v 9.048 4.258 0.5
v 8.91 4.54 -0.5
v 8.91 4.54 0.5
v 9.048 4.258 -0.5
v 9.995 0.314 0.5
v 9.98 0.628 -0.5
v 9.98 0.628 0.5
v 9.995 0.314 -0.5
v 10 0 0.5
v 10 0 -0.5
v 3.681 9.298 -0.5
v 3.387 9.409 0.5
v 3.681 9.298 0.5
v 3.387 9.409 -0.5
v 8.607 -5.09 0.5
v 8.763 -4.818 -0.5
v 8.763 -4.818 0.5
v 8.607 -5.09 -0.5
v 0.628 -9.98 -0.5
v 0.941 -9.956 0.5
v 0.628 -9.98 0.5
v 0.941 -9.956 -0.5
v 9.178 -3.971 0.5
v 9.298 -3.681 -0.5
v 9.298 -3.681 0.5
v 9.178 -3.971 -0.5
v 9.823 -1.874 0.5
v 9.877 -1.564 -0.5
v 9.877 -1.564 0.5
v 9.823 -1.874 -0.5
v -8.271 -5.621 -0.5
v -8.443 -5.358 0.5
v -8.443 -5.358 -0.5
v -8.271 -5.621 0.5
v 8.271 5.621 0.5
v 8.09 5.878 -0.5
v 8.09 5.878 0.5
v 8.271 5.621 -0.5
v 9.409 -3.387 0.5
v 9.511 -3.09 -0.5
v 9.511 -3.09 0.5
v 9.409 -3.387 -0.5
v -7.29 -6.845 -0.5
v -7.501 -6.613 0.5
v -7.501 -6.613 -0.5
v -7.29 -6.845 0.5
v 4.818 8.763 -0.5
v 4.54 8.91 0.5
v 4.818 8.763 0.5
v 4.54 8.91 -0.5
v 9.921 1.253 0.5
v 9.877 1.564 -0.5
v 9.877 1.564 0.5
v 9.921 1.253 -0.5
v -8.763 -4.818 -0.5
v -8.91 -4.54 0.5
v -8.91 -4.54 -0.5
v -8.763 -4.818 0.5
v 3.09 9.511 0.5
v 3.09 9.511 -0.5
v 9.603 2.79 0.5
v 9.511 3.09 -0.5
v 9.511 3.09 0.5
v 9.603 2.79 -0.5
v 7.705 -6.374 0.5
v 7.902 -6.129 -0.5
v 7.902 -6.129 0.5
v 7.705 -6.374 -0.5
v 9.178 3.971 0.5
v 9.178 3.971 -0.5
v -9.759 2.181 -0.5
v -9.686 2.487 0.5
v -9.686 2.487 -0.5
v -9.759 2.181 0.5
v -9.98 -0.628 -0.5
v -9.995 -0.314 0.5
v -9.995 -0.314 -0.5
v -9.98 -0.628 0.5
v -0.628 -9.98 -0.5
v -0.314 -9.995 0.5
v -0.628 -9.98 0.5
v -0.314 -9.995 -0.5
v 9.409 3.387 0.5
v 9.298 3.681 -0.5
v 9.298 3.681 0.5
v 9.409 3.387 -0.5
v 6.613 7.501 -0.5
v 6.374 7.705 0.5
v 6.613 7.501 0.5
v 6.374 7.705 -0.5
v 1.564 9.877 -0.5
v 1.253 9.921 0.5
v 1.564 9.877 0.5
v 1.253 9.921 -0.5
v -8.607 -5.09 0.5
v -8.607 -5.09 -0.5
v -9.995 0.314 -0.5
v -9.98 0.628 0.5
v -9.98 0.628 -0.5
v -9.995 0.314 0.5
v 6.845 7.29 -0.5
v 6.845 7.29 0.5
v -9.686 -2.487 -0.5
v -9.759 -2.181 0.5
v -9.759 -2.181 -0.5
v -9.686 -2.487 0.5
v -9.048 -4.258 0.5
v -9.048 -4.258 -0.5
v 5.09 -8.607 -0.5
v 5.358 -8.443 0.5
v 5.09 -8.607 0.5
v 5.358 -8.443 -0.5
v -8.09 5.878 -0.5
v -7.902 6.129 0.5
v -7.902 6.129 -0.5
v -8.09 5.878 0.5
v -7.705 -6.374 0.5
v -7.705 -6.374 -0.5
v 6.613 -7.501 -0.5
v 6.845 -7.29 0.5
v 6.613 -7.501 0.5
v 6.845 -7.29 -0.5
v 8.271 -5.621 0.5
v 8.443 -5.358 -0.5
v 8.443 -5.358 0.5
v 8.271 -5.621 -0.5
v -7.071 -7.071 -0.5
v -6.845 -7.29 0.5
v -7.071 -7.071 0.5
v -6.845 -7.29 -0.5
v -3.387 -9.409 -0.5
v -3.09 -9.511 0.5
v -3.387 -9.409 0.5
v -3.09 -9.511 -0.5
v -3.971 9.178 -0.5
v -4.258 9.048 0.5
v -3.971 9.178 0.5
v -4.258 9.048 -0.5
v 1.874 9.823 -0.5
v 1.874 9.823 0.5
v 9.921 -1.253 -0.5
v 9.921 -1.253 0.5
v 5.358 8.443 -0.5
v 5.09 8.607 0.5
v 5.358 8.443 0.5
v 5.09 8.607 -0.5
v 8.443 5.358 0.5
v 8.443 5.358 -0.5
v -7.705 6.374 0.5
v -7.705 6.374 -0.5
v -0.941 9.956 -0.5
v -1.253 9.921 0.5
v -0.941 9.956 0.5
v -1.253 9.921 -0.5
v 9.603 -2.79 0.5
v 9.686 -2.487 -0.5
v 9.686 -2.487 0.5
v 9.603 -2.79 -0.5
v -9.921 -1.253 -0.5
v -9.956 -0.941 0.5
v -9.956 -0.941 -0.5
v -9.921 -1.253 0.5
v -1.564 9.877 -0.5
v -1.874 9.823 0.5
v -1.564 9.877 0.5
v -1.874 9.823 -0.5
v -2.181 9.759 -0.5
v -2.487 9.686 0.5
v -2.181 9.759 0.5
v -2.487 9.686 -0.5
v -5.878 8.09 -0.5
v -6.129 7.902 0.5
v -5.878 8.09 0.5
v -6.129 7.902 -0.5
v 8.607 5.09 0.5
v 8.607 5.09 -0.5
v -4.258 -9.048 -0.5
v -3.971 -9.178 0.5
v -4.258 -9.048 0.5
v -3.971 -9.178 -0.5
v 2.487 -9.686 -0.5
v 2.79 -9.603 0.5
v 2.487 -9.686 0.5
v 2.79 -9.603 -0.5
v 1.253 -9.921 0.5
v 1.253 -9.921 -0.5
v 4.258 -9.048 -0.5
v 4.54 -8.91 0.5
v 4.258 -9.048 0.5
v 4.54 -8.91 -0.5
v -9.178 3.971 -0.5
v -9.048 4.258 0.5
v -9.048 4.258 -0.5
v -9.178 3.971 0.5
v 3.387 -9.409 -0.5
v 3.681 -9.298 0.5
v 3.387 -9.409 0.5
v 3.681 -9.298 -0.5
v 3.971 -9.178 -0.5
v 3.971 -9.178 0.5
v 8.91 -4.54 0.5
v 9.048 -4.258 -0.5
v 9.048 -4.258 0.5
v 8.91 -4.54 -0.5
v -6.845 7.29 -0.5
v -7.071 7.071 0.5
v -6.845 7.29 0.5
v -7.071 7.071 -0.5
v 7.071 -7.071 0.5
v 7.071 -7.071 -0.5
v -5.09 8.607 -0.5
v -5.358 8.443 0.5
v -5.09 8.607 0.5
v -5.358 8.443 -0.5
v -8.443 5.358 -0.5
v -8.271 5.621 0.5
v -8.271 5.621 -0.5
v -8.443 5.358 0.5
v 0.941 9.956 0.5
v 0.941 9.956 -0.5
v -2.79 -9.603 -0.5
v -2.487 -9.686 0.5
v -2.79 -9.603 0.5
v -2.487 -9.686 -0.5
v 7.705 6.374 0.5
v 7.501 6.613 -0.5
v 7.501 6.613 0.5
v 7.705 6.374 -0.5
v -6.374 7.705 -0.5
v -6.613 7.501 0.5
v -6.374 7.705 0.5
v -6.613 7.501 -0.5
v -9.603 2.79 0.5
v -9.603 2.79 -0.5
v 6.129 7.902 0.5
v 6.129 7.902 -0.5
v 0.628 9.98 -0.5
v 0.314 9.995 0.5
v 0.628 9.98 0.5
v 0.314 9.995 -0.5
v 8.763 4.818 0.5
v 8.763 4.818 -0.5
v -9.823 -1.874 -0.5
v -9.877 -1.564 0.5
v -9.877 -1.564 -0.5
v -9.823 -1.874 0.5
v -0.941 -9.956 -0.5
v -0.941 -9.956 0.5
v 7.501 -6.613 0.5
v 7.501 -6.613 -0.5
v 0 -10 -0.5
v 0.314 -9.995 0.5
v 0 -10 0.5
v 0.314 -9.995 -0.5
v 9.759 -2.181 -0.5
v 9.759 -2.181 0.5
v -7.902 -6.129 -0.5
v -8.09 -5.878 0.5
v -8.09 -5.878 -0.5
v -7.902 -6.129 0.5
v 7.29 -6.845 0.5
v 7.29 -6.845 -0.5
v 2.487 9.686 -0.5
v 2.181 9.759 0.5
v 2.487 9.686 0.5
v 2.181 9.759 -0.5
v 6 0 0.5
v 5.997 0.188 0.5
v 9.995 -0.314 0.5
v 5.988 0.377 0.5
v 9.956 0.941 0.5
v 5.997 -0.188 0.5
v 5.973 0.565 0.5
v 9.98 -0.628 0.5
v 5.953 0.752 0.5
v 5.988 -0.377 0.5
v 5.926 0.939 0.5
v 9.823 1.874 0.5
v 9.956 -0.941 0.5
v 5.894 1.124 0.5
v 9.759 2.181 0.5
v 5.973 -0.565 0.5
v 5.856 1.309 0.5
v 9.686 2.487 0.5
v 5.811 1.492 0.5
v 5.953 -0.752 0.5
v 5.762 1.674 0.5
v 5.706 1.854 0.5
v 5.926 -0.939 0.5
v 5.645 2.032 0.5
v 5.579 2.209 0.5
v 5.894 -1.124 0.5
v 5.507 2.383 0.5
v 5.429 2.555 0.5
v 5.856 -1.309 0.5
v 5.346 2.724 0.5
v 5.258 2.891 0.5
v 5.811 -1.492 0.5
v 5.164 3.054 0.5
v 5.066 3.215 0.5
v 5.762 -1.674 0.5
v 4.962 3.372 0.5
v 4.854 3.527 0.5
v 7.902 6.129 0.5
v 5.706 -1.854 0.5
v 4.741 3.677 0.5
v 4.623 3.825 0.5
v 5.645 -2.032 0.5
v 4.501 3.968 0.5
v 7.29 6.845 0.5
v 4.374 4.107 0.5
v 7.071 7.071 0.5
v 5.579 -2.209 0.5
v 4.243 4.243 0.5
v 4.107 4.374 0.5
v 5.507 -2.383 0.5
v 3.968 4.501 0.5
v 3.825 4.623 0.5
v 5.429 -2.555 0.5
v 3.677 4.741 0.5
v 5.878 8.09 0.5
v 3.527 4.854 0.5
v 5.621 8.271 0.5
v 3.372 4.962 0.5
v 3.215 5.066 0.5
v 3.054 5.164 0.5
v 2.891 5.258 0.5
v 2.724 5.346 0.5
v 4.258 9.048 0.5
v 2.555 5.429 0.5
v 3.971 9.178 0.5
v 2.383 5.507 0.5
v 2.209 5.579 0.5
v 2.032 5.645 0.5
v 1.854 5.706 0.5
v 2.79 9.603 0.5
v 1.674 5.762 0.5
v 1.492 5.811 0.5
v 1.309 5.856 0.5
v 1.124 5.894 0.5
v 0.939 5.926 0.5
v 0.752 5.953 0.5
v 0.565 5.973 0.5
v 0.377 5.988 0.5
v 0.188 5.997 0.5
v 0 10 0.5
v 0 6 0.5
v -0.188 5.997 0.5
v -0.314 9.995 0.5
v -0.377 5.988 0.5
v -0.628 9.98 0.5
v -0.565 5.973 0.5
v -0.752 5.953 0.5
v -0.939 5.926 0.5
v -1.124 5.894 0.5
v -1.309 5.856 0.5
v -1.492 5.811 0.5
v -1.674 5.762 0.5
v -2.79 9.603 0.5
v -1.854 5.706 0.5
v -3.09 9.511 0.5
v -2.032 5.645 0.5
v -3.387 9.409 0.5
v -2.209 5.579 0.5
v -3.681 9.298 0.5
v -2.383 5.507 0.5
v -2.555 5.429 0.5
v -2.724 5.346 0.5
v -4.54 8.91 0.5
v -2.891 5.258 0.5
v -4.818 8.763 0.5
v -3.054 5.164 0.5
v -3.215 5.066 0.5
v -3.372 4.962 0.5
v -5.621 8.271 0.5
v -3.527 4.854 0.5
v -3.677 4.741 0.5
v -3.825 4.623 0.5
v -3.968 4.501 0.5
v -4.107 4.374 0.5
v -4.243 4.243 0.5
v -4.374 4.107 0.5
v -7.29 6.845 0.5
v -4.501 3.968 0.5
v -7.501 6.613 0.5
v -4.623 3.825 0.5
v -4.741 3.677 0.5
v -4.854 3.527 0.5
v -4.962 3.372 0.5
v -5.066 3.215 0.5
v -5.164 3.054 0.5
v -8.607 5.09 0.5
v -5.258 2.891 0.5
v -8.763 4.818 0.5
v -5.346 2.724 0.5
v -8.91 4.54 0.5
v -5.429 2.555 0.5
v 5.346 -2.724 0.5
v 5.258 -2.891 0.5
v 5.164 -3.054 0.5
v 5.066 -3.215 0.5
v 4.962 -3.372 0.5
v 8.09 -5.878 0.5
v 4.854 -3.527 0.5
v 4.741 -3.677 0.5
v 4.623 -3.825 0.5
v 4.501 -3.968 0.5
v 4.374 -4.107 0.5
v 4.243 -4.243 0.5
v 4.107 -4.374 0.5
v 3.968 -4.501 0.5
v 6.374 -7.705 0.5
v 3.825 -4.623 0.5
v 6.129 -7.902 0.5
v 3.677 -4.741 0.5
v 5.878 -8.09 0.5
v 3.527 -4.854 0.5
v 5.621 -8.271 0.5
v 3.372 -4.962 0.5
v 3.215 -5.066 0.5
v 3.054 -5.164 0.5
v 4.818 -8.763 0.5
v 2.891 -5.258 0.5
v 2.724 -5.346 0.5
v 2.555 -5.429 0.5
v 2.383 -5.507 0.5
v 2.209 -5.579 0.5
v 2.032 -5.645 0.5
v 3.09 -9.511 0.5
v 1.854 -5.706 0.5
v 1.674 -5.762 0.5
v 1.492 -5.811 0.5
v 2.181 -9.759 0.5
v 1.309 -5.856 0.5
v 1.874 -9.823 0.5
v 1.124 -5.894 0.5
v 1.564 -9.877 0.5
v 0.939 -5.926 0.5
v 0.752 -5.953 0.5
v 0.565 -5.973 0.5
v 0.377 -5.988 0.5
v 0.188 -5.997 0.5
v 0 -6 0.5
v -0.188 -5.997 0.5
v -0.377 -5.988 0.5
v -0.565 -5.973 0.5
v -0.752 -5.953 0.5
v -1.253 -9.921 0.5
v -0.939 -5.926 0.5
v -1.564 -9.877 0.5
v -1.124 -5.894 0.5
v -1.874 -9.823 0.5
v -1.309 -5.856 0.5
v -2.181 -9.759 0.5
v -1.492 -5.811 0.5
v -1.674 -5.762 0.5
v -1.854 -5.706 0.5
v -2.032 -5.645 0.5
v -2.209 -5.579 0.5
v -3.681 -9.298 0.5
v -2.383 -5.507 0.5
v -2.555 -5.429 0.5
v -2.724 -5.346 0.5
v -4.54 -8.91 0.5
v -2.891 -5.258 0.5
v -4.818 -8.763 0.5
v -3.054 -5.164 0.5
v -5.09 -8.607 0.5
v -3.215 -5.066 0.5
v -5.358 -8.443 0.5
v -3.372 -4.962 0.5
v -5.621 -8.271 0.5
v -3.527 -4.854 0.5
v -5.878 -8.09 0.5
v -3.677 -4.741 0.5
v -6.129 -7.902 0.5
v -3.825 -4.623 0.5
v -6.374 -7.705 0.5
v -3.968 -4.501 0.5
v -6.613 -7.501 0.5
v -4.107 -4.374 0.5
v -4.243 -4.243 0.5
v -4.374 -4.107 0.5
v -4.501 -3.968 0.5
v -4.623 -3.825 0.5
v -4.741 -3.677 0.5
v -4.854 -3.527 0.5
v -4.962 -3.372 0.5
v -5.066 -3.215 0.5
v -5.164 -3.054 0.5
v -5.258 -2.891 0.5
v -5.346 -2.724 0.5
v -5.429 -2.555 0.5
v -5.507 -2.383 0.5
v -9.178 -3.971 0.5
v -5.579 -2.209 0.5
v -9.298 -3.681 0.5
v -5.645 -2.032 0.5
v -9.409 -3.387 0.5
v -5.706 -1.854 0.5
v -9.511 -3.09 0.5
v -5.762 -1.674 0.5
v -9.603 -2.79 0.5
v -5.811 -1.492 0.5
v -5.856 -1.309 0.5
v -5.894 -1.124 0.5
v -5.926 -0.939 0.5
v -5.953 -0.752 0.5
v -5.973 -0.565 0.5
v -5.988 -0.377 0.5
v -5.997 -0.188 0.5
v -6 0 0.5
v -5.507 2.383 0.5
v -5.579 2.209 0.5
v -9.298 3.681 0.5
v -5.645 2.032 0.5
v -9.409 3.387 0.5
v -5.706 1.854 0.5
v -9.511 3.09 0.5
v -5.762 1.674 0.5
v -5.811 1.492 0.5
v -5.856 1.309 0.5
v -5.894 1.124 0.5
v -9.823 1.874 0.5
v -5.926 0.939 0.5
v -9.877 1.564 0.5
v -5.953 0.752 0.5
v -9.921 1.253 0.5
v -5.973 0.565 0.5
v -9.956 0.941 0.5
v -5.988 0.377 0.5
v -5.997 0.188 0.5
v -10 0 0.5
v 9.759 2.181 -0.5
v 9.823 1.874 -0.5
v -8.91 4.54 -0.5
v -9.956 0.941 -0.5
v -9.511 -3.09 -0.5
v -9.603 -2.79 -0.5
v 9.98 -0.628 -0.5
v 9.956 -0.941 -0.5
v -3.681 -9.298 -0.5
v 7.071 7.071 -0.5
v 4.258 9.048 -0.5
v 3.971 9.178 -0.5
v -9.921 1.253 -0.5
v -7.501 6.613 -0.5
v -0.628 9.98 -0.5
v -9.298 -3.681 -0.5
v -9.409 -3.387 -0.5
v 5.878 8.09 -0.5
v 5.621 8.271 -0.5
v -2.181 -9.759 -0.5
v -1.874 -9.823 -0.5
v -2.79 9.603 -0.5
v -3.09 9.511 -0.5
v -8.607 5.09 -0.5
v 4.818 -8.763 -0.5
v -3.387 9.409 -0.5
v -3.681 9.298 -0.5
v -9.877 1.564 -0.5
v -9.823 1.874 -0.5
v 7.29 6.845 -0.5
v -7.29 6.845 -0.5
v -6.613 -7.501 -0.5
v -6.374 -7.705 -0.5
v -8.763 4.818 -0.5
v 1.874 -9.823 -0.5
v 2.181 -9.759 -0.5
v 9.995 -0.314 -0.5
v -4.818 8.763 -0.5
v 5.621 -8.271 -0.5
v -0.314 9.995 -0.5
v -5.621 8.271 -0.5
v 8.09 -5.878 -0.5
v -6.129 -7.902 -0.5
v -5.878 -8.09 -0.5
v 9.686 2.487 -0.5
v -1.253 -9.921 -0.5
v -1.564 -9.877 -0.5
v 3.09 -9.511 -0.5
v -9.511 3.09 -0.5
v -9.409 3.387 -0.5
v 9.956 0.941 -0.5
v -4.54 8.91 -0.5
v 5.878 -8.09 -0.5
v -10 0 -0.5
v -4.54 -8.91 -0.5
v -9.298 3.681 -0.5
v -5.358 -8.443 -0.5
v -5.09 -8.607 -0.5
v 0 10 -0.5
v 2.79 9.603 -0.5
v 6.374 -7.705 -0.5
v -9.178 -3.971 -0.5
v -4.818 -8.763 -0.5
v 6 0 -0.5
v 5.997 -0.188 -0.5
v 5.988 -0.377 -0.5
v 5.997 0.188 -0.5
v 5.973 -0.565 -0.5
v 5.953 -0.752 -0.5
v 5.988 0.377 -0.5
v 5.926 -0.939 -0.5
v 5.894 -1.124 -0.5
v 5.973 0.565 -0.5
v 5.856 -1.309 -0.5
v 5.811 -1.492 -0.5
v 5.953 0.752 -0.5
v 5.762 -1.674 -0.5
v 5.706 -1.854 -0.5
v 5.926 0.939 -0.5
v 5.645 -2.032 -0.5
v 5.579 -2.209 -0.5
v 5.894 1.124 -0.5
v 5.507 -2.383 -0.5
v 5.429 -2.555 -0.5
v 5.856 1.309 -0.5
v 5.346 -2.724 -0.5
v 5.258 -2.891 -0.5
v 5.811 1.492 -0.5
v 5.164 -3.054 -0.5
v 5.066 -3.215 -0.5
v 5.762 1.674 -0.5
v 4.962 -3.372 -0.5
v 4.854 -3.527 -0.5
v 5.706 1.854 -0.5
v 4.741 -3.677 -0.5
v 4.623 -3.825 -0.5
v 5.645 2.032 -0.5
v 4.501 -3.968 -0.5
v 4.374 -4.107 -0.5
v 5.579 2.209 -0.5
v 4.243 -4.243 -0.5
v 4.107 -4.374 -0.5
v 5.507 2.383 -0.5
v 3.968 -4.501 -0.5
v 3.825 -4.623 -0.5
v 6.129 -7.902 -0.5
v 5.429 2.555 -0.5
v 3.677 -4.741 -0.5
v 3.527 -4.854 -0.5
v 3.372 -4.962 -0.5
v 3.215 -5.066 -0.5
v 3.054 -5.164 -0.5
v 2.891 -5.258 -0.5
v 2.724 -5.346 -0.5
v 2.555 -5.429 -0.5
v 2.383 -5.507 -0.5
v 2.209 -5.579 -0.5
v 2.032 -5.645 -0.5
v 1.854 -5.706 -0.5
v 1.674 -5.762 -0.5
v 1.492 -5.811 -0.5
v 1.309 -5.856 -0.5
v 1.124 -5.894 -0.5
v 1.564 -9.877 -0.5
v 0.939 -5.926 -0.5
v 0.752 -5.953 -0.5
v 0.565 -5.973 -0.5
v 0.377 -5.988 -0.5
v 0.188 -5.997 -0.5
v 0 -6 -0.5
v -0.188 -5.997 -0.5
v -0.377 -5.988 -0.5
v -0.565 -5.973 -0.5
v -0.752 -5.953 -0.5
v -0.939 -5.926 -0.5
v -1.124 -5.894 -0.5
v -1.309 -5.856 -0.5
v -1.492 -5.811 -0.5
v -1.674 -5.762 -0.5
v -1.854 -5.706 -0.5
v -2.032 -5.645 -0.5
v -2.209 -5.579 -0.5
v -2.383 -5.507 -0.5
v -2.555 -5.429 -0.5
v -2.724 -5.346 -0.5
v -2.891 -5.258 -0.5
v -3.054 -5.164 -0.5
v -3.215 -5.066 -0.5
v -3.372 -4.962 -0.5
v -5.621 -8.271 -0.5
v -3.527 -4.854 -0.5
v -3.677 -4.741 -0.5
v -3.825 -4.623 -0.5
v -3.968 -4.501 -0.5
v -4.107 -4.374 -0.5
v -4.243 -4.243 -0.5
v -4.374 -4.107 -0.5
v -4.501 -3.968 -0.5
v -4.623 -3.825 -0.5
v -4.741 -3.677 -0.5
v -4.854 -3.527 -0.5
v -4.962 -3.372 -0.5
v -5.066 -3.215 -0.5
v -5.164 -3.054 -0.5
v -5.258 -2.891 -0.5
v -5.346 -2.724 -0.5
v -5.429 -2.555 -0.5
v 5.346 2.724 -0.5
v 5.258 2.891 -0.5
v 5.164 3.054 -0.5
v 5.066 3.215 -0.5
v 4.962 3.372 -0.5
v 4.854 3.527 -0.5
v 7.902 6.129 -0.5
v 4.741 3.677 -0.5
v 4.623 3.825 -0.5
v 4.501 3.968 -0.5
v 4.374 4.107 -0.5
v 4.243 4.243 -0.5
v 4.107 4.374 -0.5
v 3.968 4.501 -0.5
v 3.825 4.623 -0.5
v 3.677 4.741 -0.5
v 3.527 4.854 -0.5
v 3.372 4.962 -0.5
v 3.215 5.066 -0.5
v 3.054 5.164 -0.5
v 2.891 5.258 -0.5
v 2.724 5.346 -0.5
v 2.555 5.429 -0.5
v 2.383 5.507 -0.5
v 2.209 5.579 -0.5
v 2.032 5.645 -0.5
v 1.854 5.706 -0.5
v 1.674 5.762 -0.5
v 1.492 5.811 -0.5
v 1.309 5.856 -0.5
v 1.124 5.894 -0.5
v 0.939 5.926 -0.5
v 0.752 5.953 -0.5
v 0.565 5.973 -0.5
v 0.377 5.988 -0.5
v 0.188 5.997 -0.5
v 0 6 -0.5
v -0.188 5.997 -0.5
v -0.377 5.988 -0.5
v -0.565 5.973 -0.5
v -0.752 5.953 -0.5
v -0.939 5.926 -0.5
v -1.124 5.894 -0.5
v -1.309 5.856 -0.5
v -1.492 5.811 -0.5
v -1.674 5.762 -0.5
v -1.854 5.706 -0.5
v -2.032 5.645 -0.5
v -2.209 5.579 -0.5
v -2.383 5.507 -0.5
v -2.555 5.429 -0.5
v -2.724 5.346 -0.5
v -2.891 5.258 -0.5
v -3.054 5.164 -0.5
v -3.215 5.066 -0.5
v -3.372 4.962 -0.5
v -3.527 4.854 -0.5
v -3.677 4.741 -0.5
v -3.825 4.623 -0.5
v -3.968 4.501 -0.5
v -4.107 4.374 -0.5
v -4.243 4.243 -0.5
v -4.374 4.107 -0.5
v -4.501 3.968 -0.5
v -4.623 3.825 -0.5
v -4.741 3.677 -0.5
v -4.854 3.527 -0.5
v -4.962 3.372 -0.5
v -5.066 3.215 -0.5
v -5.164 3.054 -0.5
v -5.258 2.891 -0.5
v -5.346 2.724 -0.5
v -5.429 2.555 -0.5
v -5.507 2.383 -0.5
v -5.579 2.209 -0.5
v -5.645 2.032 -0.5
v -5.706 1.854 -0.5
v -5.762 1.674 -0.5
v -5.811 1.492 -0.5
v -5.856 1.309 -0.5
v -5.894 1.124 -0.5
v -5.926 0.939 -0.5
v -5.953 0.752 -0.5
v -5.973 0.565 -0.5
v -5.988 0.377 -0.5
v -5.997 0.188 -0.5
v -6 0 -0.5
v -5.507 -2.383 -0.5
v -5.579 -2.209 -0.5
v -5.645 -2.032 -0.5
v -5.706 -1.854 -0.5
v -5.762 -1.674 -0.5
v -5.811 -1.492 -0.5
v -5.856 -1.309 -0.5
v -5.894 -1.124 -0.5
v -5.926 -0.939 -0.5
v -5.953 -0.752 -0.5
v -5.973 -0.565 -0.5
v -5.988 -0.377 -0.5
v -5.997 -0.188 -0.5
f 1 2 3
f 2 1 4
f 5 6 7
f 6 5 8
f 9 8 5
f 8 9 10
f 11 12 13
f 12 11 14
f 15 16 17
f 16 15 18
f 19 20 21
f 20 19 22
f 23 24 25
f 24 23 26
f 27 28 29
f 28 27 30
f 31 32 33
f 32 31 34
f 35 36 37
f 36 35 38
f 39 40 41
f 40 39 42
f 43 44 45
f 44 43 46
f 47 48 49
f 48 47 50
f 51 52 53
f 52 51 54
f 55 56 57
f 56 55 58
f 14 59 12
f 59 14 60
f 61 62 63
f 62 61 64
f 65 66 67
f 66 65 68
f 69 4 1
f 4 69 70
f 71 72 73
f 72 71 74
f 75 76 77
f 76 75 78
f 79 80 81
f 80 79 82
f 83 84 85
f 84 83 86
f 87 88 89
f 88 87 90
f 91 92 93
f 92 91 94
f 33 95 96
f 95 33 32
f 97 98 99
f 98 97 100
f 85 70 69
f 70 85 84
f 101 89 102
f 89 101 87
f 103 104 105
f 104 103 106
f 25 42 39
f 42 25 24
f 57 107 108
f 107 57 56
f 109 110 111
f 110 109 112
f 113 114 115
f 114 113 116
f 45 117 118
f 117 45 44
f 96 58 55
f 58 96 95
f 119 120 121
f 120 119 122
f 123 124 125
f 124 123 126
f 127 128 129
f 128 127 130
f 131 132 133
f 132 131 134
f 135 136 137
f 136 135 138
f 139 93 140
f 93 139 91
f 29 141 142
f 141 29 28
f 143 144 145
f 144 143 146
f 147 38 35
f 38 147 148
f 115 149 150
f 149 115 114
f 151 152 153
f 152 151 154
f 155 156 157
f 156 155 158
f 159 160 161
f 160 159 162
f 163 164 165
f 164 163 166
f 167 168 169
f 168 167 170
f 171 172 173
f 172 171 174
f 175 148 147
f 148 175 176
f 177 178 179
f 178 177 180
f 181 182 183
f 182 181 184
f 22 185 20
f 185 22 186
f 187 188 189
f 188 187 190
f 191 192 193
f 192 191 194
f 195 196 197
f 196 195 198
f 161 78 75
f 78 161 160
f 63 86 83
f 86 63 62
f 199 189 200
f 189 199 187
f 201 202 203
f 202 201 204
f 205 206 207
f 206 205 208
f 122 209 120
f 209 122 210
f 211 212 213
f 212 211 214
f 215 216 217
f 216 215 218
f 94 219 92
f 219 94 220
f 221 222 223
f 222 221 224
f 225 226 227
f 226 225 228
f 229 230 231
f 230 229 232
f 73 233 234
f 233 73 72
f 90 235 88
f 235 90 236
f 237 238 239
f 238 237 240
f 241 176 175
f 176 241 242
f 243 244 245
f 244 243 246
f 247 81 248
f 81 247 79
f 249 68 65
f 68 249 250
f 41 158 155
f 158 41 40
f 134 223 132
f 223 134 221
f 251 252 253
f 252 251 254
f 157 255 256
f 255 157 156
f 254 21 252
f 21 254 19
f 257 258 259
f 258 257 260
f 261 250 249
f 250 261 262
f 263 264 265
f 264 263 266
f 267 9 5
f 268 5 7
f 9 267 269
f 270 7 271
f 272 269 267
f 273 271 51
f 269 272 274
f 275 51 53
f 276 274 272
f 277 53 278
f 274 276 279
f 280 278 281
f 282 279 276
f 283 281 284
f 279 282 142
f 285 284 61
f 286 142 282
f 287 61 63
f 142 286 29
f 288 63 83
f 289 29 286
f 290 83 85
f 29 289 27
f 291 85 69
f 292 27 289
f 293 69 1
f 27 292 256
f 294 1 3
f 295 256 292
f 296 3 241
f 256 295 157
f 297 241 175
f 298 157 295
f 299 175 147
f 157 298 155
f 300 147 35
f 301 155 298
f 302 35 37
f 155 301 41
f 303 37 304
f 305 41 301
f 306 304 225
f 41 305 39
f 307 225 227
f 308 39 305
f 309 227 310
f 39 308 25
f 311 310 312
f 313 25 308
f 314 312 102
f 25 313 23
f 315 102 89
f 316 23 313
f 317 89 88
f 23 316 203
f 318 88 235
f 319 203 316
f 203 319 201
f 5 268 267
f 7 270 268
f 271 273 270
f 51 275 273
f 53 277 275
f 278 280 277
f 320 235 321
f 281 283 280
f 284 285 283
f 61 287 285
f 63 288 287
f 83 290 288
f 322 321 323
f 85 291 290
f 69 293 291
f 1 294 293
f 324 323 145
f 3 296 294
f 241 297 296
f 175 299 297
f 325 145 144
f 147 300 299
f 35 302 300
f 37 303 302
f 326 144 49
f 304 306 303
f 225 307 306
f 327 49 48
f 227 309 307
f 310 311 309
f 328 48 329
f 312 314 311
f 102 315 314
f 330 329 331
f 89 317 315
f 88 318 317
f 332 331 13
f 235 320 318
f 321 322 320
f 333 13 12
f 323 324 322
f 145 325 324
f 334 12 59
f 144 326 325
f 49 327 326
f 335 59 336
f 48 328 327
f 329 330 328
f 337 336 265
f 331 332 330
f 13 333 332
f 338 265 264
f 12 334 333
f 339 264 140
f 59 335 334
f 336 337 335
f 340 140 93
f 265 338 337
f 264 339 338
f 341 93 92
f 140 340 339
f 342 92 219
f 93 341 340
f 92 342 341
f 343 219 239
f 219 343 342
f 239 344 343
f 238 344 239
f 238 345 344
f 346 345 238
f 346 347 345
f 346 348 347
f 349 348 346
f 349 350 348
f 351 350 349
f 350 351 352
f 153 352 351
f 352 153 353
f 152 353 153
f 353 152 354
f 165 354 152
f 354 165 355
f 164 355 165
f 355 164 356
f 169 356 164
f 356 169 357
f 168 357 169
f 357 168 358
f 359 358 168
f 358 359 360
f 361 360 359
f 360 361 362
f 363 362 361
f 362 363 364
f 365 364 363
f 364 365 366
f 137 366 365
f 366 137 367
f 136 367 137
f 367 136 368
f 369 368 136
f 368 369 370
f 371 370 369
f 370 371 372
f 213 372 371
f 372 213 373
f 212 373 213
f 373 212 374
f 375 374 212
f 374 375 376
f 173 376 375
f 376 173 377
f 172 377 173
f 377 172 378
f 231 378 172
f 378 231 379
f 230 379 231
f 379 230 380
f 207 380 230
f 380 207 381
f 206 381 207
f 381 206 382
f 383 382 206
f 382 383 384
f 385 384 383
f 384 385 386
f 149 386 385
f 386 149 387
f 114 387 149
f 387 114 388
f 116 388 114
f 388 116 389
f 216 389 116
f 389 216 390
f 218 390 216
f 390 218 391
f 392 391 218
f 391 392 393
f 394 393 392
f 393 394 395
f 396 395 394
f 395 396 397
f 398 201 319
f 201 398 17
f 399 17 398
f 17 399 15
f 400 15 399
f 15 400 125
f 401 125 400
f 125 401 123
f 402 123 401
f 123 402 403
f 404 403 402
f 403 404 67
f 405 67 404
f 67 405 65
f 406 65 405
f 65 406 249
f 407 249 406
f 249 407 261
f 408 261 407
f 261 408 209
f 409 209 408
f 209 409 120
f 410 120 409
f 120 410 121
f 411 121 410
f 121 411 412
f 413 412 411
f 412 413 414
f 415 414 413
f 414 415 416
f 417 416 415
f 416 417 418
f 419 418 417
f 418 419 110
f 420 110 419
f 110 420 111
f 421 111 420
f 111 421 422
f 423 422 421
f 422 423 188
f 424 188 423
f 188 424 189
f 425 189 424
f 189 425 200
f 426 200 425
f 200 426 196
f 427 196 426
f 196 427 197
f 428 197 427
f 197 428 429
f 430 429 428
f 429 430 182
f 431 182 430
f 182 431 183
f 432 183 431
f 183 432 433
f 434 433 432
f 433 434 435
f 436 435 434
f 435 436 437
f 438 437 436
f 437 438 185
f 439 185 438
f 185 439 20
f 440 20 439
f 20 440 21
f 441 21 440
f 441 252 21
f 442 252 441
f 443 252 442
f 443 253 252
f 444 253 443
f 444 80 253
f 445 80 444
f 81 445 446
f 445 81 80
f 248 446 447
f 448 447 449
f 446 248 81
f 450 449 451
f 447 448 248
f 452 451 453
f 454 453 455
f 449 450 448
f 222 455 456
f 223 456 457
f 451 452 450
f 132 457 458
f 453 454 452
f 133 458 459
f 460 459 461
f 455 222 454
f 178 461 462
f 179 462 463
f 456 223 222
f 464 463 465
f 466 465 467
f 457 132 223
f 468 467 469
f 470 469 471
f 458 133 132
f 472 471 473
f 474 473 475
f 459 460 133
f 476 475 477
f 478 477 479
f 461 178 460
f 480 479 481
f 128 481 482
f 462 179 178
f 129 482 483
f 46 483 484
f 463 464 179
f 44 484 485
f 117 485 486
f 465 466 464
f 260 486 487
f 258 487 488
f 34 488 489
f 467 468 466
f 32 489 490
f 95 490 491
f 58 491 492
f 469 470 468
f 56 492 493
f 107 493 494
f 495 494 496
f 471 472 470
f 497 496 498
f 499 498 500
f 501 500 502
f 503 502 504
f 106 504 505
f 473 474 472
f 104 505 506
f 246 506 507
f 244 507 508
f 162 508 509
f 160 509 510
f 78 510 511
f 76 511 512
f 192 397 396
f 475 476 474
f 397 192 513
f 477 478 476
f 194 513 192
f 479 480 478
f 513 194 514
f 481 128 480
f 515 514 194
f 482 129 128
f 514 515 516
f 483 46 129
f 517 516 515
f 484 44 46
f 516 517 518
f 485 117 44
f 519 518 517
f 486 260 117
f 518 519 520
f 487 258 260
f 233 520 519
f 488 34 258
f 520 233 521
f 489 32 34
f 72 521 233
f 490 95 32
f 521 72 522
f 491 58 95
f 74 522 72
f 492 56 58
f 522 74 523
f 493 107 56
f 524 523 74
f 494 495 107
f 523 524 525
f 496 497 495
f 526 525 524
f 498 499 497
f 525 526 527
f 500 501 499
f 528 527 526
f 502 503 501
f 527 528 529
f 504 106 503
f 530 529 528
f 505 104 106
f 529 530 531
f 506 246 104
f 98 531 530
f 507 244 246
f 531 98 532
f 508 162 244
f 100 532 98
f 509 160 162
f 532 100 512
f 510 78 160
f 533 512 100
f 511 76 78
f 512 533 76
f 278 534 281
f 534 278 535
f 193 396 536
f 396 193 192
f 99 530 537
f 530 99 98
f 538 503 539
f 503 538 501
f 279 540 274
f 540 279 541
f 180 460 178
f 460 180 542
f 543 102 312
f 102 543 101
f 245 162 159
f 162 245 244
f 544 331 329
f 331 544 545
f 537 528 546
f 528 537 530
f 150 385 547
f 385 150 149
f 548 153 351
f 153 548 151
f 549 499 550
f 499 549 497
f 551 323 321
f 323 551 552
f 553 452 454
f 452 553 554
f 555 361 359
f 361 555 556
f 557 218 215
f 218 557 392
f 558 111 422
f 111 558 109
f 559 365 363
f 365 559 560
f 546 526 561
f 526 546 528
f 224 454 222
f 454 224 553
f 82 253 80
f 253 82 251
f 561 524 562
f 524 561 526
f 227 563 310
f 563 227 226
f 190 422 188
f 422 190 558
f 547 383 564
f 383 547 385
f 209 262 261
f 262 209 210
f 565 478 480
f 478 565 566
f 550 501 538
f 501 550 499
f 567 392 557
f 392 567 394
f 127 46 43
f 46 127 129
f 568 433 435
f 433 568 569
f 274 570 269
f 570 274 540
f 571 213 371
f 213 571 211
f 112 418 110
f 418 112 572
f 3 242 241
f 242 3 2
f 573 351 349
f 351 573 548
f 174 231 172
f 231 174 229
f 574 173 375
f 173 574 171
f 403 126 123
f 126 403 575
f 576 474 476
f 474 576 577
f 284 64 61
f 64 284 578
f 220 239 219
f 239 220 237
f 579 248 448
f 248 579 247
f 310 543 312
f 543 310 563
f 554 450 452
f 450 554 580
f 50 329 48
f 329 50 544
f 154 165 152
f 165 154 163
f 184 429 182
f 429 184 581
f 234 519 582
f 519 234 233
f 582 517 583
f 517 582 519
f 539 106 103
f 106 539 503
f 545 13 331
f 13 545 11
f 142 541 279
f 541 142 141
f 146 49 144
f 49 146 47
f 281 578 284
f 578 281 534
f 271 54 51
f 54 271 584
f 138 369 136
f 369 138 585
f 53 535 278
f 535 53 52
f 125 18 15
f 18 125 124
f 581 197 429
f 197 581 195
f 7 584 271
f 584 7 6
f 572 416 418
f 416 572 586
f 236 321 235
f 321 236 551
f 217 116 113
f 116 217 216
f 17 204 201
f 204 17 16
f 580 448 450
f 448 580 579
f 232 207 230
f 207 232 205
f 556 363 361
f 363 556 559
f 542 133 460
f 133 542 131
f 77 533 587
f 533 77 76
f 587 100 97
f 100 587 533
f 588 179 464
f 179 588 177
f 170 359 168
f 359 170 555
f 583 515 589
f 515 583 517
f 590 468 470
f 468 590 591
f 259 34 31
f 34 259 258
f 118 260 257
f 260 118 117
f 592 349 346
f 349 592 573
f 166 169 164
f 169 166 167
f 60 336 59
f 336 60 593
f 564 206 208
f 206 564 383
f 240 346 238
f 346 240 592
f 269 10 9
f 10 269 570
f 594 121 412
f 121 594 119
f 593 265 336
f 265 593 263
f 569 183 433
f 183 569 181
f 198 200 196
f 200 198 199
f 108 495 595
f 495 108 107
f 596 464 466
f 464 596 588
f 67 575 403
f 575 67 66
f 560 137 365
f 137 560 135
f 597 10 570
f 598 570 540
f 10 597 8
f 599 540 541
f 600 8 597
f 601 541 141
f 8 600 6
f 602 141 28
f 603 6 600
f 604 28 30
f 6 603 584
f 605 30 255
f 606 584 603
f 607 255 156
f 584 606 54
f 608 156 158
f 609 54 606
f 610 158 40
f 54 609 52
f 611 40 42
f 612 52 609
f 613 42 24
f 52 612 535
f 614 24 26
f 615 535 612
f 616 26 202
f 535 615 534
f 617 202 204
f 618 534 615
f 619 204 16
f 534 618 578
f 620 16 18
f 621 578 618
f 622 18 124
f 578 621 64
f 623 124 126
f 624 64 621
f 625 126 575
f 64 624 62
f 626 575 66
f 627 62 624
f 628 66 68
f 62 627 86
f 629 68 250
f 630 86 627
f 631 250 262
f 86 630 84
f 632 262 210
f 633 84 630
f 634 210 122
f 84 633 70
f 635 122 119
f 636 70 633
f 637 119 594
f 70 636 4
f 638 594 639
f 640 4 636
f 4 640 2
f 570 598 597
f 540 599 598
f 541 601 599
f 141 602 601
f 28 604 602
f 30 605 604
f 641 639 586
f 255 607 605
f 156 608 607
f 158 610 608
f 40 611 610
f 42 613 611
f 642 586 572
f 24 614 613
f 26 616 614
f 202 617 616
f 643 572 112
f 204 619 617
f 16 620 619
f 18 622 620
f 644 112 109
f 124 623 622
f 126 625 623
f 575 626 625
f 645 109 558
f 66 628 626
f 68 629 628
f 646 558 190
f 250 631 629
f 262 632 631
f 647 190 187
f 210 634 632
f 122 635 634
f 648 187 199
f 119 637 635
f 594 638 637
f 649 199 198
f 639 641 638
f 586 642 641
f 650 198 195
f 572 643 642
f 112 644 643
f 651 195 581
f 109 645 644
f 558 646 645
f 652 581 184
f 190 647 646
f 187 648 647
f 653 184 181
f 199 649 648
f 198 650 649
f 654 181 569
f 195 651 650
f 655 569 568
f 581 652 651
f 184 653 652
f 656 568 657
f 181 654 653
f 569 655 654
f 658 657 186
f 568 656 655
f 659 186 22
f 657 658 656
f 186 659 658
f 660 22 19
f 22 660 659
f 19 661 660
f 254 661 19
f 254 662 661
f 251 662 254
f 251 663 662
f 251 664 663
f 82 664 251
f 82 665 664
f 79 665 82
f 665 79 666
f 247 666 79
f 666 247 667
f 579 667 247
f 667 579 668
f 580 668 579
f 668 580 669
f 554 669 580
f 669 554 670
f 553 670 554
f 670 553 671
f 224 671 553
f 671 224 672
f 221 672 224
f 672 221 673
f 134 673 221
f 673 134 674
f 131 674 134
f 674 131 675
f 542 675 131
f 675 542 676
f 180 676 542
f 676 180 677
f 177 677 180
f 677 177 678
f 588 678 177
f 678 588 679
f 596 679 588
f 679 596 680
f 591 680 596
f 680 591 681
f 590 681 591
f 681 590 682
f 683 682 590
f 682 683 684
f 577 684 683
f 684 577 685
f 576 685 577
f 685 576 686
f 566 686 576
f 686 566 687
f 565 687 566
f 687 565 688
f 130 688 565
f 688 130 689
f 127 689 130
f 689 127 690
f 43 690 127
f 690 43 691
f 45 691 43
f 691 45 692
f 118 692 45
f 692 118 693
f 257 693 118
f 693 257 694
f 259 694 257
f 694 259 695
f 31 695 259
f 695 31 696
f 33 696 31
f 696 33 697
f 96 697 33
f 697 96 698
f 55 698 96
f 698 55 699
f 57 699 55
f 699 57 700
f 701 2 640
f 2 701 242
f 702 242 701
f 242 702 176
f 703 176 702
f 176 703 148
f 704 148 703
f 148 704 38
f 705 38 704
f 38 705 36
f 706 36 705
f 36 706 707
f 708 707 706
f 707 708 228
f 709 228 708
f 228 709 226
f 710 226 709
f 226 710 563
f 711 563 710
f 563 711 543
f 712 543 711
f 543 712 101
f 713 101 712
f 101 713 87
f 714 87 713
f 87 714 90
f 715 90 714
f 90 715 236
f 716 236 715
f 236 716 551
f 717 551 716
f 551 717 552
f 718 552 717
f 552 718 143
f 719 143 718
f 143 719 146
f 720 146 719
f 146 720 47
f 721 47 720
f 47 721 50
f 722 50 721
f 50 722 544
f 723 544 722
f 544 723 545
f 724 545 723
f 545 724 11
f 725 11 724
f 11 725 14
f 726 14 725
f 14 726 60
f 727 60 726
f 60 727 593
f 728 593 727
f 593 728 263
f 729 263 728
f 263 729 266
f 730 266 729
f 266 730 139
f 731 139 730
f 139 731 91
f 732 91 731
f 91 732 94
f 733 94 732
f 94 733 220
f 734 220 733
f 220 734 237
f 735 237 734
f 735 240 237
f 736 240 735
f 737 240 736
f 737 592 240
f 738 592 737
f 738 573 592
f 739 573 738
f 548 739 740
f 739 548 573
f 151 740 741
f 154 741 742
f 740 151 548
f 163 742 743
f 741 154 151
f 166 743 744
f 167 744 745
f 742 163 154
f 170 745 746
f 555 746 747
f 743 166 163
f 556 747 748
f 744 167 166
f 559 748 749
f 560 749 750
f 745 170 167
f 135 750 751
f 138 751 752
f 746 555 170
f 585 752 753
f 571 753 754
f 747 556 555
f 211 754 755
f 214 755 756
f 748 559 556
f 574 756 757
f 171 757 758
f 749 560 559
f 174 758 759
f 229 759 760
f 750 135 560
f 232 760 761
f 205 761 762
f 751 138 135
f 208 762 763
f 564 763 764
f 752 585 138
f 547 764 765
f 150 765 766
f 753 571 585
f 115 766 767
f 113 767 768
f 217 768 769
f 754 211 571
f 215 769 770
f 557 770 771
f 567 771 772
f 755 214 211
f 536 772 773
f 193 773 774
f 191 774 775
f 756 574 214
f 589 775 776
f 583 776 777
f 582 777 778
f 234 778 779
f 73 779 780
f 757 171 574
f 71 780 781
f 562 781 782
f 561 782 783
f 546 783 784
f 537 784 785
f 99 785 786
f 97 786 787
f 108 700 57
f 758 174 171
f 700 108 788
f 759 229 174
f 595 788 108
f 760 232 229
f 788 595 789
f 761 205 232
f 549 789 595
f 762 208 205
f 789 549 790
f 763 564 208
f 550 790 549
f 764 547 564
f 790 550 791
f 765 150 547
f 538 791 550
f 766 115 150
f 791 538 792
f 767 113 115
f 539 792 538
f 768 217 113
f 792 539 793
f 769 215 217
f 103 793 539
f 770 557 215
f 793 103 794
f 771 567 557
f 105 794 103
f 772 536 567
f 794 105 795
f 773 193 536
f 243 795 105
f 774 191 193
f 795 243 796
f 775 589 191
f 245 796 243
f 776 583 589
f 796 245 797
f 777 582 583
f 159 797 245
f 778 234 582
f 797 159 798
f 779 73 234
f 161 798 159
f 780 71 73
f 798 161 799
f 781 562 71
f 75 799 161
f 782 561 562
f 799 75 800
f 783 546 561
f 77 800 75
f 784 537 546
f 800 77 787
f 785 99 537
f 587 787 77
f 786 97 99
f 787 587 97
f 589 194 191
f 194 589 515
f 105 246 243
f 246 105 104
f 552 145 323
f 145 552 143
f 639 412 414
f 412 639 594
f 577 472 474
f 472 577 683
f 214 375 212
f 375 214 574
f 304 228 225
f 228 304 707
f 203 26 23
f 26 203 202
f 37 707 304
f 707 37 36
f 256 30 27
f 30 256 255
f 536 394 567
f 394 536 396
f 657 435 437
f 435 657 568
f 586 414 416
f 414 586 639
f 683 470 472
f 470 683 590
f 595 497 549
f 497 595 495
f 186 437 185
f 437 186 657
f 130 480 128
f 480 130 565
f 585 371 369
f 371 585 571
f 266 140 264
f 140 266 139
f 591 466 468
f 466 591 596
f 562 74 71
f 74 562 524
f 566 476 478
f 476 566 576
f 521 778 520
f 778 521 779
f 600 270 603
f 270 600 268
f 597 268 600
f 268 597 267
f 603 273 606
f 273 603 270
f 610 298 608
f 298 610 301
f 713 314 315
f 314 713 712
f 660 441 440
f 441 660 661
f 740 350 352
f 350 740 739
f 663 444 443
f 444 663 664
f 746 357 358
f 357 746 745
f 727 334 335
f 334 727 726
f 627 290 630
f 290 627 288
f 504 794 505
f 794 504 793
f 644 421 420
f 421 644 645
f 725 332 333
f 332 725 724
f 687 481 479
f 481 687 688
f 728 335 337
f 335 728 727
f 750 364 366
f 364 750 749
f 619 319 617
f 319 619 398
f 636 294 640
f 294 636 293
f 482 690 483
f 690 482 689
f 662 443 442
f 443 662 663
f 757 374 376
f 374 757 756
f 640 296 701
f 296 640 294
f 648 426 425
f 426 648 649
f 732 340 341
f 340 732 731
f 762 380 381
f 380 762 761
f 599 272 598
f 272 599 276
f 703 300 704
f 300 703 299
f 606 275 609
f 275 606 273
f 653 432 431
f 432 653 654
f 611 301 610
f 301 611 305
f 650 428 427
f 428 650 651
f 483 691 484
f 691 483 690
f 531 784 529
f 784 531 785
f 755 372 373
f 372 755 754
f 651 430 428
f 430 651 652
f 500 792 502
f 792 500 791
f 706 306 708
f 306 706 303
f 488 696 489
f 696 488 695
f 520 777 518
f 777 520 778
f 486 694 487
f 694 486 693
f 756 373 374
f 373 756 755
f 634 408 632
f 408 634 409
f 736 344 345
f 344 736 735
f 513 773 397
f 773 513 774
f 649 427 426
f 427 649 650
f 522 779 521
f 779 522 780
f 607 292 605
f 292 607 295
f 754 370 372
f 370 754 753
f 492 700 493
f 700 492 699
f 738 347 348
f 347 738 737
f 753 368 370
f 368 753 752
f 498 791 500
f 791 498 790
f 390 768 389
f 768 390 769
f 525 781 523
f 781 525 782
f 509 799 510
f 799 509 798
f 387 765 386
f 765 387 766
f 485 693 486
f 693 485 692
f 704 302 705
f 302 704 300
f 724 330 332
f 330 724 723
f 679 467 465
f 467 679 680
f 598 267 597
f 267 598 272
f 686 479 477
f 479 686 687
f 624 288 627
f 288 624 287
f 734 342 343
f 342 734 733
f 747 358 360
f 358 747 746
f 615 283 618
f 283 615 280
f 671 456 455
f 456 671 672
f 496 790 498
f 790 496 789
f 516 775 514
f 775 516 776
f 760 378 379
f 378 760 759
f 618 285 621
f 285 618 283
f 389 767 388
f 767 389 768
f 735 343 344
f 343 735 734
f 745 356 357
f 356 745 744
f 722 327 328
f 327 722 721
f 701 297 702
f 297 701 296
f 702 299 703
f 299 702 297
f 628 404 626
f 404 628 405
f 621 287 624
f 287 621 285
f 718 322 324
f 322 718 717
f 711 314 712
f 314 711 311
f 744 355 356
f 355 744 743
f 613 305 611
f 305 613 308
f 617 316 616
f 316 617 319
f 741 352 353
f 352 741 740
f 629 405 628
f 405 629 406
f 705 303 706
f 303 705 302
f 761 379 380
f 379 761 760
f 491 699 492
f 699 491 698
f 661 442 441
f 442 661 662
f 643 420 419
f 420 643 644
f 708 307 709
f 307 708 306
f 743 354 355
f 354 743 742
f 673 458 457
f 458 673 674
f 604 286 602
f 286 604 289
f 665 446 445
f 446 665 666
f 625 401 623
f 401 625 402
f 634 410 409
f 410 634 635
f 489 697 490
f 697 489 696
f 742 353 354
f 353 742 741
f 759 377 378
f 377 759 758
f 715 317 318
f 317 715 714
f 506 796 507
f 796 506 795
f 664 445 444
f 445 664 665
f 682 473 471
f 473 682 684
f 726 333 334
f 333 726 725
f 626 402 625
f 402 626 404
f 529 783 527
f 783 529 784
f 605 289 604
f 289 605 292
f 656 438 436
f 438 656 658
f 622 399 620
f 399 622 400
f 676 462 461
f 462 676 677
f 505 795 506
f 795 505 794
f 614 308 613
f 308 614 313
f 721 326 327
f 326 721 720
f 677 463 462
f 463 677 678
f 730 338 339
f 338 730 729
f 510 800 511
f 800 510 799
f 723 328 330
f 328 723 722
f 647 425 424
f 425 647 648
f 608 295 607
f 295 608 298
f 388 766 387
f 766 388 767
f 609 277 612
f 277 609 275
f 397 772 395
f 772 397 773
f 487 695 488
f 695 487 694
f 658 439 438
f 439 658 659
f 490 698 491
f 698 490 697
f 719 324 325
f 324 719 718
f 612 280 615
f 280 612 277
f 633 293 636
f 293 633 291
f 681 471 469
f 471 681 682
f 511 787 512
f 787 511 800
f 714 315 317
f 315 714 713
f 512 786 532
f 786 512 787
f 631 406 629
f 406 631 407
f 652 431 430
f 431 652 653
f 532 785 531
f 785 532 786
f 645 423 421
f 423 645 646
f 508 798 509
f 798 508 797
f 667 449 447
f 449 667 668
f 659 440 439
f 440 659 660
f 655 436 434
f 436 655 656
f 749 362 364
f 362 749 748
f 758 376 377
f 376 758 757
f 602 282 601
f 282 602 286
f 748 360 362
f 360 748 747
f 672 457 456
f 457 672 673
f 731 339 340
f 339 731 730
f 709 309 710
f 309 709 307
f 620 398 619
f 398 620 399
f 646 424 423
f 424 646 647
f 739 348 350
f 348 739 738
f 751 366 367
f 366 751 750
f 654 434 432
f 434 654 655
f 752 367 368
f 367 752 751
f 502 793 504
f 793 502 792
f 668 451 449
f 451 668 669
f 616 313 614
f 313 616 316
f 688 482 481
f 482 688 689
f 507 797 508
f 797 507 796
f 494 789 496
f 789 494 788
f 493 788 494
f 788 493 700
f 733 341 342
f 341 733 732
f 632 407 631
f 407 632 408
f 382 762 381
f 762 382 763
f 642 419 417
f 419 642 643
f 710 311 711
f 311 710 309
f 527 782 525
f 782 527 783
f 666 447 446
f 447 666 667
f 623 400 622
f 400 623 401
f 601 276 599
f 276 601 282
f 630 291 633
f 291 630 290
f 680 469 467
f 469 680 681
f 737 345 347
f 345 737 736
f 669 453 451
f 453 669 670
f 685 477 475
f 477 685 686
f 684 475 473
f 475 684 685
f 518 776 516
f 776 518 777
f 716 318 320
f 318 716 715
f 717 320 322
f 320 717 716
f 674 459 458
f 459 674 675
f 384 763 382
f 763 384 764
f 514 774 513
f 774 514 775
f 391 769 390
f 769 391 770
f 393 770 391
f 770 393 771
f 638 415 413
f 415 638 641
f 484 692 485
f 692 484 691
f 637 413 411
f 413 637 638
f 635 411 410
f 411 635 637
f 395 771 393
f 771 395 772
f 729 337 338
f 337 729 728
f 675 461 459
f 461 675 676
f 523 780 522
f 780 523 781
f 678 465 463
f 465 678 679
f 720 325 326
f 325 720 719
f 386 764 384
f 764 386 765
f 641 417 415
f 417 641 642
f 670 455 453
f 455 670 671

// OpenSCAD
$fn = $preview ? 50 : 200;

difference() {
  cylinder(1, 10, 10, center=true);
  cylinder(2, 6, 6, center=true);
}
